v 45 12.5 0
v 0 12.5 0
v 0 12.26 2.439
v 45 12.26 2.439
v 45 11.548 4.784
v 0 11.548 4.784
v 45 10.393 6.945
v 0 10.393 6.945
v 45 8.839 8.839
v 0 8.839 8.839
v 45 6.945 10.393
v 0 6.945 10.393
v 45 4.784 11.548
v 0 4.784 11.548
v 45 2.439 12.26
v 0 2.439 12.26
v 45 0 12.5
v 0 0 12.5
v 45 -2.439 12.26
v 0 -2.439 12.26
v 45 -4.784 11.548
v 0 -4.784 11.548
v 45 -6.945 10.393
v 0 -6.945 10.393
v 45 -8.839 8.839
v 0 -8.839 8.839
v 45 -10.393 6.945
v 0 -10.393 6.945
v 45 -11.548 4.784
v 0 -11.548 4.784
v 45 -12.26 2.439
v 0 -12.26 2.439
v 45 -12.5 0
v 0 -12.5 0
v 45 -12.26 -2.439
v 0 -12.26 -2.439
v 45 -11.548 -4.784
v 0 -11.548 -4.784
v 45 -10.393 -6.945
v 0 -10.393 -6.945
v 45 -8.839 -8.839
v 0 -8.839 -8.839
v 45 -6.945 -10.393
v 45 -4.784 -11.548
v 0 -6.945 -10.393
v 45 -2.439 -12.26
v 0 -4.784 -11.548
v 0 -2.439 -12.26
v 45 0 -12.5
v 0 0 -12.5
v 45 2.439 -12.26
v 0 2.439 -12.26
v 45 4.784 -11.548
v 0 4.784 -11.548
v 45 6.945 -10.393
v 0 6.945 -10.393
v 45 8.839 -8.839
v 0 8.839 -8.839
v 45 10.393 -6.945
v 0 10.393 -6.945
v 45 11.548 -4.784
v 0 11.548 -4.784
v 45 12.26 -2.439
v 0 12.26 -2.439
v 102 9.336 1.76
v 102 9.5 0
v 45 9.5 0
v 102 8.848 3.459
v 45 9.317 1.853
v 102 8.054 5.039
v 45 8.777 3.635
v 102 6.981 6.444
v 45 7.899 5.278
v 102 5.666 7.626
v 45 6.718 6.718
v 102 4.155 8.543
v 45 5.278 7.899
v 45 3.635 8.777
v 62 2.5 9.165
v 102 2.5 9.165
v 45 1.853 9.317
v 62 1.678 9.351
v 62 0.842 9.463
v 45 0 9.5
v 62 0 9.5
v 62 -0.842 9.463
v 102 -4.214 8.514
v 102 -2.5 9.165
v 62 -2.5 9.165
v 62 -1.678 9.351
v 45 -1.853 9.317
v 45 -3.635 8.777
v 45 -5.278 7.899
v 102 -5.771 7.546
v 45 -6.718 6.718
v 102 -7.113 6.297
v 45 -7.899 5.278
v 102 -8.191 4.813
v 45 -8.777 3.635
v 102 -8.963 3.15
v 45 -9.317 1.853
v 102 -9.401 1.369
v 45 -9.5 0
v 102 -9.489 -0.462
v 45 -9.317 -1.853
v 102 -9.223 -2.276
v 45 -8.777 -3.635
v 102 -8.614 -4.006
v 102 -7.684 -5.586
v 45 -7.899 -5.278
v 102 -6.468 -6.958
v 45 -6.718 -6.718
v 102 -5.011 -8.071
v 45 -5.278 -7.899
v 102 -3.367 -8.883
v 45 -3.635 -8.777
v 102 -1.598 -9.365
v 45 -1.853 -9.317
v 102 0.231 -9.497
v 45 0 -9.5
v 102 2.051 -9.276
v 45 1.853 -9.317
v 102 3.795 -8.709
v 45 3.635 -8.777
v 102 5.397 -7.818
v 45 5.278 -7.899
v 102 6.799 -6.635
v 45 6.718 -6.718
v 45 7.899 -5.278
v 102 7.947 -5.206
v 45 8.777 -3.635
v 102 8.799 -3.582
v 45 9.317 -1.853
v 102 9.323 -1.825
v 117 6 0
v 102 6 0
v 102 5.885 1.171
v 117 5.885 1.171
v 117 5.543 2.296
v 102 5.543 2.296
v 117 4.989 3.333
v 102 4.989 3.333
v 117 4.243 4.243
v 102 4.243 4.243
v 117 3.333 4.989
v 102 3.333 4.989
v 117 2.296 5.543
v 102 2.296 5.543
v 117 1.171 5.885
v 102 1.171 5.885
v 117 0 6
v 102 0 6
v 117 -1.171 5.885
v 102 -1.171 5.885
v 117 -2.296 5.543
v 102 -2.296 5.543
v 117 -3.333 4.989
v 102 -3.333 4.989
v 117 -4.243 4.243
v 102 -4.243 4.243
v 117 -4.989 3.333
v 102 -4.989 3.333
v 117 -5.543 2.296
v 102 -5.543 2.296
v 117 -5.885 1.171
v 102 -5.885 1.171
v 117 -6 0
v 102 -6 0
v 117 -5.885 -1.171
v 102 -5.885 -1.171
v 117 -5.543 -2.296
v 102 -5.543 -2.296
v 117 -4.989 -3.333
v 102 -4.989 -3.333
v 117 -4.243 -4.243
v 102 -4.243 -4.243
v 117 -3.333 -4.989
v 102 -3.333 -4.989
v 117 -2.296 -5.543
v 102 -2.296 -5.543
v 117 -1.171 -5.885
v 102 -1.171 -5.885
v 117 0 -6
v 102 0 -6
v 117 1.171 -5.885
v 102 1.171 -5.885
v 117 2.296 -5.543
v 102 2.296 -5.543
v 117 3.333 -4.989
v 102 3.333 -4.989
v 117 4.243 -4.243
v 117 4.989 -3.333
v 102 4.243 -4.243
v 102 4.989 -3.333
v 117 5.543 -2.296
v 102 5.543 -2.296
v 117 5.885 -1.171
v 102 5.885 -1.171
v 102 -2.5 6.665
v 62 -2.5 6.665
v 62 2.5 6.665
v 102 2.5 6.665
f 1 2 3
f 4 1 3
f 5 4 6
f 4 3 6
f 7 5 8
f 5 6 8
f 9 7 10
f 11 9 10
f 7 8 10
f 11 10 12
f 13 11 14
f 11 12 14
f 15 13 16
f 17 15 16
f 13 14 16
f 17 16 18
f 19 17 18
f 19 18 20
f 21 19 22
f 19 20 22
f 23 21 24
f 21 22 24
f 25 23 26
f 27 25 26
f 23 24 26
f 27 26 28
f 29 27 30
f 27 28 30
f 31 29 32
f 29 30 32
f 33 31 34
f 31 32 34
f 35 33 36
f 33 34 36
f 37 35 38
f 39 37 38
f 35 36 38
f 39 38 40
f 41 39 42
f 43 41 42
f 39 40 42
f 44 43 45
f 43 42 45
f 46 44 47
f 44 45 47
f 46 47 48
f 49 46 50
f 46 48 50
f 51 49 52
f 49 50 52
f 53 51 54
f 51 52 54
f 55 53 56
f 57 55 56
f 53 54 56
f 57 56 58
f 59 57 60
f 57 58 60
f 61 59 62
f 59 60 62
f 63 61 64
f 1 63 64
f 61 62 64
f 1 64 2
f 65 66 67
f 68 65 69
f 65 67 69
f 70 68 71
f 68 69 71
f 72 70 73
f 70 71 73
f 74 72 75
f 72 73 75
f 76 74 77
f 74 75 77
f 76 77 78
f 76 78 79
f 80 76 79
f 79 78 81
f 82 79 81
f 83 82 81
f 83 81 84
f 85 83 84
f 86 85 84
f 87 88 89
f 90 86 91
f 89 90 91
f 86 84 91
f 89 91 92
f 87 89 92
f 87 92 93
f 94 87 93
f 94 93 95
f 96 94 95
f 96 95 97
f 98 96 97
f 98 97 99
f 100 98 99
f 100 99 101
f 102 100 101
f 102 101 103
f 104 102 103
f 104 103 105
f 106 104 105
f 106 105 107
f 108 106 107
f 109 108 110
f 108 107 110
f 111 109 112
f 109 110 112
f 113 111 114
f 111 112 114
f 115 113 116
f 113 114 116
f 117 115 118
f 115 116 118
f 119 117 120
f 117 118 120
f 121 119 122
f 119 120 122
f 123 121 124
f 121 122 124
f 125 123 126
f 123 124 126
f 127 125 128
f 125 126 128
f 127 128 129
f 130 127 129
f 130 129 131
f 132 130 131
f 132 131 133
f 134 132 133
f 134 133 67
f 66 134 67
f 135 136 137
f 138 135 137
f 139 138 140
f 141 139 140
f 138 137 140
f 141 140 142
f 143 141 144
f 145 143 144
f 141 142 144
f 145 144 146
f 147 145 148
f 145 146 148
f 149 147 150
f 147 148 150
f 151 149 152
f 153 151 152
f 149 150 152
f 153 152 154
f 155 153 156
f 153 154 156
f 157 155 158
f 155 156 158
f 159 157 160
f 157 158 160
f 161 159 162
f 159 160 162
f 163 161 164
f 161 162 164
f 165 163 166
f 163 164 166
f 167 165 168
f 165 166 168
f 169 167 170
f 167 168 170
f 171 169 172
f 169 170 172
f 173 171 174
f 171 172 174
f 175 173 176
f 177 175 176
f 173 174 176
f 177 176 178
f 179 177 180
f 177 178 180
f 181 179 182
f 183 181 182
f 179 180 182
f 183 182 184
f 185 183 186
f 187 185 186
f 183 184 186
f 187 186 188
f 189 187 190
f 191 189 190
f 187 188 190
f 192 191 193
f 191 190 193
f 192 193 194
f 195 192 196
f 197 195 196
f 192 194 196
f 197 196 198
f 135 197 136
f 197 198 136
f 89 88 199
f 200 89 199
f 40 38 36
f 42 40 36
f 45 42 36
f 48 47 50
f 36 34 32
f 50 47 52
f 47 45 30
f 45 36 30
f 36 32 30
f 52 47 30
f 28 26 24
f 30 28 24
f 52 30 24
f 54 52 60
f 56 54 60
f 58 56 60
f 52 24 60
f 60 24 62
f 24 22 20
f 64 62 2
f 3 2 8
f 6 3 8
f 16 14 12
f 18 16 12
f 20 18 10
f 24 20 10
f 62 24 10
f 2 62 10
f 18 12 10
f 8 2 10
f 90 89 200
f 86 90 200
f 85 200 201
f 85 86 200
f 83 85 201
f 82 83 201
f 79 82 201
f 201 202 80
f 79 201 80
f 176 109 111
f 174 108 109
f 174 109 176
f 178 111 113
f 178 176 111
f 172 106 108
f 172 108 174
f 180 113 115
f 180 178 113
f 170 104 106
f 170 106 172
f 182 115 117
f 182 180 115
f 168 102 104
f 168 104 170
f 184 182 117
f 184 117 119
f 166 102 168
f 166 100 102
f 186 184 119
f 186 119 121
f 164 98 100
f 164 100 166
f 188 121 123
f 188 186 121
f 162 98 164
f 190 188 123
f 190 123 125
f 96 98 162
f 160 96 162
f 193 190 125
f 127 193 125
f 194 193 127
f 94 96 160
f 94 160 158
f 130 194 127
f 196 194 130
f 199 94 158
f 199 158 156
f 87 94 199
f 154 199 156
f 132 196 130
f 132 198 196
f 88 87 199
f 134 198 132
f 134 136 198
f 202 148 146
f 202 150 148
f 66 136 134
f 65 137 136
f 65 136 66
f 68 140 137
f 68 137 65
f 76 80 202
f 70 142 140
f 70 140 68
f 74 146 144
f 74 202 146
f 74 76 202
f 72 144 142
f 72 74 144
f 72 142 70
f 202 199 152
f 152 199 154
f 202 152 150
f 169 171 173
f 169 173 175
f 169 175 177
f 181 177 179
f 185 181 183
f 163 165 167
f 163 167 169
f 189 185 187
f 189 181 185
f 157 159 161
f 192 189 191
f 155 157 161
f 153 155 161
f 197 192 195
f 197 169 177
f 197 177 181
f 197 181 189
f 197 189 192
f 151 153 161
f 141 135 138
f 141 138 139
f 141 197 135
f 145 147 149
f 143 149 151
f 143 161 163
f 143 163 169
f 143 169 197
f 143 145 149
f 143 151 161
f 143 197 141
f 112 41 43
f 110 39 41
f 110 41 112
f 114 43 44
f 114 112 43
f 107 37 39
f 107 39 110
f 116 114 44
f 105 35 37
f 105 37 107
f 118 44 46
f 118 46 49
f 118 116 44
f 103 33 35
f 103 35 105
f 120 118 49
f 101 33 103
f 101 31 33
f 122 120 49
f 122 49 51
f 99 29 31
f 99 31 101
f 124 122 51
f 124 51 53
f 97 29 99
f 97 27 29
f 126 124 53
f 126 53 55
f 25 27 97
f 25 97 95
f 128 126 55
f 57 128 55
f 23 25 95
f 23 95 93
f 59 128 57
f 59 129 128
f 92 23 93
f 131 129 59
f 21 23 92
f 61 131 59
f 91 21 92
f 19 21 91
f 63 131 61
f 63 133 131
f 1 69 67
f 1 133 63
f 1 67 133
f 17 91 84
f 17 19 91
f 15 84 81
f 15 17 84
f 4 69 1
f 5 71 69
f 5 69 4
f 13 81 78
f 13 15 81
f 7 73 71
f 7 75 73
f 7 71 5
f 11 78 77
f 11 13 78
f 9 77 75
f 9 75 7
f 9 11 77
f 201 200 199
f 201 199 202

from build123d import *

# Parameters (mm, degrees)
F0_R     = 12.5
F1_DEPTH = 45
F2_R     = 9.5
F3_DEPTH = 57
F4_R     = 6
F5_DEPTH = 15
F6_DEPTH = 40


with BuildPart() as f1:
    # F0 (on Right) → F1 (new body)
    with BuildSketch(Plane.YZ):
        Circle(F0_R)
    extrude(amount=F1_DEPTH)

    # F2 (on face) → F3 (join)
    with BuildSketch(Plane.YZ.offset(45)):
        Circle(F2_R)
    extrude(amount=F3_DEPTH)

    # F4 (on face) → F5 (join)
    with BuildSketch(Plane.YZ.offset(102)):
        Circle(F4_R)
    extrude(amount=F5_DEPTH)

    # F4 (on face) → F6 (cut, symmetric)
    with BuildSketch(Plane.YZ.offset(102)):
        with BuildLine():
            Line((0, 9.5), (0, 6.6651513899))
            Line((0, 6.6651513899), (2.5, 6.6651513899))
            Line((2.5, 6.6651513899), (2.5, 9.1651513899))
            ThreePointArc((2.5, 9.1651513899), (1.2611625184, 9.4159157336), (0, 9.5))
        make_face()
        with BuildLine():
            Line((-2.5, 9.1651513899), (-2.5, 6.6651513899))
            Line((-2.5, 6.6651513899), (0, 6.6651513899))
            Line((0, 6.6651513899), (0, 9.5))
            ThreePointArc((0, 9.5), (-1.2611625184, 9.4159157336), (-2.5, 9.1651513899))
        make_face()
    extrude(amount=F6_DEPTH, both=True, mode=Mode.SUBTRACT)


solid = f1.part
